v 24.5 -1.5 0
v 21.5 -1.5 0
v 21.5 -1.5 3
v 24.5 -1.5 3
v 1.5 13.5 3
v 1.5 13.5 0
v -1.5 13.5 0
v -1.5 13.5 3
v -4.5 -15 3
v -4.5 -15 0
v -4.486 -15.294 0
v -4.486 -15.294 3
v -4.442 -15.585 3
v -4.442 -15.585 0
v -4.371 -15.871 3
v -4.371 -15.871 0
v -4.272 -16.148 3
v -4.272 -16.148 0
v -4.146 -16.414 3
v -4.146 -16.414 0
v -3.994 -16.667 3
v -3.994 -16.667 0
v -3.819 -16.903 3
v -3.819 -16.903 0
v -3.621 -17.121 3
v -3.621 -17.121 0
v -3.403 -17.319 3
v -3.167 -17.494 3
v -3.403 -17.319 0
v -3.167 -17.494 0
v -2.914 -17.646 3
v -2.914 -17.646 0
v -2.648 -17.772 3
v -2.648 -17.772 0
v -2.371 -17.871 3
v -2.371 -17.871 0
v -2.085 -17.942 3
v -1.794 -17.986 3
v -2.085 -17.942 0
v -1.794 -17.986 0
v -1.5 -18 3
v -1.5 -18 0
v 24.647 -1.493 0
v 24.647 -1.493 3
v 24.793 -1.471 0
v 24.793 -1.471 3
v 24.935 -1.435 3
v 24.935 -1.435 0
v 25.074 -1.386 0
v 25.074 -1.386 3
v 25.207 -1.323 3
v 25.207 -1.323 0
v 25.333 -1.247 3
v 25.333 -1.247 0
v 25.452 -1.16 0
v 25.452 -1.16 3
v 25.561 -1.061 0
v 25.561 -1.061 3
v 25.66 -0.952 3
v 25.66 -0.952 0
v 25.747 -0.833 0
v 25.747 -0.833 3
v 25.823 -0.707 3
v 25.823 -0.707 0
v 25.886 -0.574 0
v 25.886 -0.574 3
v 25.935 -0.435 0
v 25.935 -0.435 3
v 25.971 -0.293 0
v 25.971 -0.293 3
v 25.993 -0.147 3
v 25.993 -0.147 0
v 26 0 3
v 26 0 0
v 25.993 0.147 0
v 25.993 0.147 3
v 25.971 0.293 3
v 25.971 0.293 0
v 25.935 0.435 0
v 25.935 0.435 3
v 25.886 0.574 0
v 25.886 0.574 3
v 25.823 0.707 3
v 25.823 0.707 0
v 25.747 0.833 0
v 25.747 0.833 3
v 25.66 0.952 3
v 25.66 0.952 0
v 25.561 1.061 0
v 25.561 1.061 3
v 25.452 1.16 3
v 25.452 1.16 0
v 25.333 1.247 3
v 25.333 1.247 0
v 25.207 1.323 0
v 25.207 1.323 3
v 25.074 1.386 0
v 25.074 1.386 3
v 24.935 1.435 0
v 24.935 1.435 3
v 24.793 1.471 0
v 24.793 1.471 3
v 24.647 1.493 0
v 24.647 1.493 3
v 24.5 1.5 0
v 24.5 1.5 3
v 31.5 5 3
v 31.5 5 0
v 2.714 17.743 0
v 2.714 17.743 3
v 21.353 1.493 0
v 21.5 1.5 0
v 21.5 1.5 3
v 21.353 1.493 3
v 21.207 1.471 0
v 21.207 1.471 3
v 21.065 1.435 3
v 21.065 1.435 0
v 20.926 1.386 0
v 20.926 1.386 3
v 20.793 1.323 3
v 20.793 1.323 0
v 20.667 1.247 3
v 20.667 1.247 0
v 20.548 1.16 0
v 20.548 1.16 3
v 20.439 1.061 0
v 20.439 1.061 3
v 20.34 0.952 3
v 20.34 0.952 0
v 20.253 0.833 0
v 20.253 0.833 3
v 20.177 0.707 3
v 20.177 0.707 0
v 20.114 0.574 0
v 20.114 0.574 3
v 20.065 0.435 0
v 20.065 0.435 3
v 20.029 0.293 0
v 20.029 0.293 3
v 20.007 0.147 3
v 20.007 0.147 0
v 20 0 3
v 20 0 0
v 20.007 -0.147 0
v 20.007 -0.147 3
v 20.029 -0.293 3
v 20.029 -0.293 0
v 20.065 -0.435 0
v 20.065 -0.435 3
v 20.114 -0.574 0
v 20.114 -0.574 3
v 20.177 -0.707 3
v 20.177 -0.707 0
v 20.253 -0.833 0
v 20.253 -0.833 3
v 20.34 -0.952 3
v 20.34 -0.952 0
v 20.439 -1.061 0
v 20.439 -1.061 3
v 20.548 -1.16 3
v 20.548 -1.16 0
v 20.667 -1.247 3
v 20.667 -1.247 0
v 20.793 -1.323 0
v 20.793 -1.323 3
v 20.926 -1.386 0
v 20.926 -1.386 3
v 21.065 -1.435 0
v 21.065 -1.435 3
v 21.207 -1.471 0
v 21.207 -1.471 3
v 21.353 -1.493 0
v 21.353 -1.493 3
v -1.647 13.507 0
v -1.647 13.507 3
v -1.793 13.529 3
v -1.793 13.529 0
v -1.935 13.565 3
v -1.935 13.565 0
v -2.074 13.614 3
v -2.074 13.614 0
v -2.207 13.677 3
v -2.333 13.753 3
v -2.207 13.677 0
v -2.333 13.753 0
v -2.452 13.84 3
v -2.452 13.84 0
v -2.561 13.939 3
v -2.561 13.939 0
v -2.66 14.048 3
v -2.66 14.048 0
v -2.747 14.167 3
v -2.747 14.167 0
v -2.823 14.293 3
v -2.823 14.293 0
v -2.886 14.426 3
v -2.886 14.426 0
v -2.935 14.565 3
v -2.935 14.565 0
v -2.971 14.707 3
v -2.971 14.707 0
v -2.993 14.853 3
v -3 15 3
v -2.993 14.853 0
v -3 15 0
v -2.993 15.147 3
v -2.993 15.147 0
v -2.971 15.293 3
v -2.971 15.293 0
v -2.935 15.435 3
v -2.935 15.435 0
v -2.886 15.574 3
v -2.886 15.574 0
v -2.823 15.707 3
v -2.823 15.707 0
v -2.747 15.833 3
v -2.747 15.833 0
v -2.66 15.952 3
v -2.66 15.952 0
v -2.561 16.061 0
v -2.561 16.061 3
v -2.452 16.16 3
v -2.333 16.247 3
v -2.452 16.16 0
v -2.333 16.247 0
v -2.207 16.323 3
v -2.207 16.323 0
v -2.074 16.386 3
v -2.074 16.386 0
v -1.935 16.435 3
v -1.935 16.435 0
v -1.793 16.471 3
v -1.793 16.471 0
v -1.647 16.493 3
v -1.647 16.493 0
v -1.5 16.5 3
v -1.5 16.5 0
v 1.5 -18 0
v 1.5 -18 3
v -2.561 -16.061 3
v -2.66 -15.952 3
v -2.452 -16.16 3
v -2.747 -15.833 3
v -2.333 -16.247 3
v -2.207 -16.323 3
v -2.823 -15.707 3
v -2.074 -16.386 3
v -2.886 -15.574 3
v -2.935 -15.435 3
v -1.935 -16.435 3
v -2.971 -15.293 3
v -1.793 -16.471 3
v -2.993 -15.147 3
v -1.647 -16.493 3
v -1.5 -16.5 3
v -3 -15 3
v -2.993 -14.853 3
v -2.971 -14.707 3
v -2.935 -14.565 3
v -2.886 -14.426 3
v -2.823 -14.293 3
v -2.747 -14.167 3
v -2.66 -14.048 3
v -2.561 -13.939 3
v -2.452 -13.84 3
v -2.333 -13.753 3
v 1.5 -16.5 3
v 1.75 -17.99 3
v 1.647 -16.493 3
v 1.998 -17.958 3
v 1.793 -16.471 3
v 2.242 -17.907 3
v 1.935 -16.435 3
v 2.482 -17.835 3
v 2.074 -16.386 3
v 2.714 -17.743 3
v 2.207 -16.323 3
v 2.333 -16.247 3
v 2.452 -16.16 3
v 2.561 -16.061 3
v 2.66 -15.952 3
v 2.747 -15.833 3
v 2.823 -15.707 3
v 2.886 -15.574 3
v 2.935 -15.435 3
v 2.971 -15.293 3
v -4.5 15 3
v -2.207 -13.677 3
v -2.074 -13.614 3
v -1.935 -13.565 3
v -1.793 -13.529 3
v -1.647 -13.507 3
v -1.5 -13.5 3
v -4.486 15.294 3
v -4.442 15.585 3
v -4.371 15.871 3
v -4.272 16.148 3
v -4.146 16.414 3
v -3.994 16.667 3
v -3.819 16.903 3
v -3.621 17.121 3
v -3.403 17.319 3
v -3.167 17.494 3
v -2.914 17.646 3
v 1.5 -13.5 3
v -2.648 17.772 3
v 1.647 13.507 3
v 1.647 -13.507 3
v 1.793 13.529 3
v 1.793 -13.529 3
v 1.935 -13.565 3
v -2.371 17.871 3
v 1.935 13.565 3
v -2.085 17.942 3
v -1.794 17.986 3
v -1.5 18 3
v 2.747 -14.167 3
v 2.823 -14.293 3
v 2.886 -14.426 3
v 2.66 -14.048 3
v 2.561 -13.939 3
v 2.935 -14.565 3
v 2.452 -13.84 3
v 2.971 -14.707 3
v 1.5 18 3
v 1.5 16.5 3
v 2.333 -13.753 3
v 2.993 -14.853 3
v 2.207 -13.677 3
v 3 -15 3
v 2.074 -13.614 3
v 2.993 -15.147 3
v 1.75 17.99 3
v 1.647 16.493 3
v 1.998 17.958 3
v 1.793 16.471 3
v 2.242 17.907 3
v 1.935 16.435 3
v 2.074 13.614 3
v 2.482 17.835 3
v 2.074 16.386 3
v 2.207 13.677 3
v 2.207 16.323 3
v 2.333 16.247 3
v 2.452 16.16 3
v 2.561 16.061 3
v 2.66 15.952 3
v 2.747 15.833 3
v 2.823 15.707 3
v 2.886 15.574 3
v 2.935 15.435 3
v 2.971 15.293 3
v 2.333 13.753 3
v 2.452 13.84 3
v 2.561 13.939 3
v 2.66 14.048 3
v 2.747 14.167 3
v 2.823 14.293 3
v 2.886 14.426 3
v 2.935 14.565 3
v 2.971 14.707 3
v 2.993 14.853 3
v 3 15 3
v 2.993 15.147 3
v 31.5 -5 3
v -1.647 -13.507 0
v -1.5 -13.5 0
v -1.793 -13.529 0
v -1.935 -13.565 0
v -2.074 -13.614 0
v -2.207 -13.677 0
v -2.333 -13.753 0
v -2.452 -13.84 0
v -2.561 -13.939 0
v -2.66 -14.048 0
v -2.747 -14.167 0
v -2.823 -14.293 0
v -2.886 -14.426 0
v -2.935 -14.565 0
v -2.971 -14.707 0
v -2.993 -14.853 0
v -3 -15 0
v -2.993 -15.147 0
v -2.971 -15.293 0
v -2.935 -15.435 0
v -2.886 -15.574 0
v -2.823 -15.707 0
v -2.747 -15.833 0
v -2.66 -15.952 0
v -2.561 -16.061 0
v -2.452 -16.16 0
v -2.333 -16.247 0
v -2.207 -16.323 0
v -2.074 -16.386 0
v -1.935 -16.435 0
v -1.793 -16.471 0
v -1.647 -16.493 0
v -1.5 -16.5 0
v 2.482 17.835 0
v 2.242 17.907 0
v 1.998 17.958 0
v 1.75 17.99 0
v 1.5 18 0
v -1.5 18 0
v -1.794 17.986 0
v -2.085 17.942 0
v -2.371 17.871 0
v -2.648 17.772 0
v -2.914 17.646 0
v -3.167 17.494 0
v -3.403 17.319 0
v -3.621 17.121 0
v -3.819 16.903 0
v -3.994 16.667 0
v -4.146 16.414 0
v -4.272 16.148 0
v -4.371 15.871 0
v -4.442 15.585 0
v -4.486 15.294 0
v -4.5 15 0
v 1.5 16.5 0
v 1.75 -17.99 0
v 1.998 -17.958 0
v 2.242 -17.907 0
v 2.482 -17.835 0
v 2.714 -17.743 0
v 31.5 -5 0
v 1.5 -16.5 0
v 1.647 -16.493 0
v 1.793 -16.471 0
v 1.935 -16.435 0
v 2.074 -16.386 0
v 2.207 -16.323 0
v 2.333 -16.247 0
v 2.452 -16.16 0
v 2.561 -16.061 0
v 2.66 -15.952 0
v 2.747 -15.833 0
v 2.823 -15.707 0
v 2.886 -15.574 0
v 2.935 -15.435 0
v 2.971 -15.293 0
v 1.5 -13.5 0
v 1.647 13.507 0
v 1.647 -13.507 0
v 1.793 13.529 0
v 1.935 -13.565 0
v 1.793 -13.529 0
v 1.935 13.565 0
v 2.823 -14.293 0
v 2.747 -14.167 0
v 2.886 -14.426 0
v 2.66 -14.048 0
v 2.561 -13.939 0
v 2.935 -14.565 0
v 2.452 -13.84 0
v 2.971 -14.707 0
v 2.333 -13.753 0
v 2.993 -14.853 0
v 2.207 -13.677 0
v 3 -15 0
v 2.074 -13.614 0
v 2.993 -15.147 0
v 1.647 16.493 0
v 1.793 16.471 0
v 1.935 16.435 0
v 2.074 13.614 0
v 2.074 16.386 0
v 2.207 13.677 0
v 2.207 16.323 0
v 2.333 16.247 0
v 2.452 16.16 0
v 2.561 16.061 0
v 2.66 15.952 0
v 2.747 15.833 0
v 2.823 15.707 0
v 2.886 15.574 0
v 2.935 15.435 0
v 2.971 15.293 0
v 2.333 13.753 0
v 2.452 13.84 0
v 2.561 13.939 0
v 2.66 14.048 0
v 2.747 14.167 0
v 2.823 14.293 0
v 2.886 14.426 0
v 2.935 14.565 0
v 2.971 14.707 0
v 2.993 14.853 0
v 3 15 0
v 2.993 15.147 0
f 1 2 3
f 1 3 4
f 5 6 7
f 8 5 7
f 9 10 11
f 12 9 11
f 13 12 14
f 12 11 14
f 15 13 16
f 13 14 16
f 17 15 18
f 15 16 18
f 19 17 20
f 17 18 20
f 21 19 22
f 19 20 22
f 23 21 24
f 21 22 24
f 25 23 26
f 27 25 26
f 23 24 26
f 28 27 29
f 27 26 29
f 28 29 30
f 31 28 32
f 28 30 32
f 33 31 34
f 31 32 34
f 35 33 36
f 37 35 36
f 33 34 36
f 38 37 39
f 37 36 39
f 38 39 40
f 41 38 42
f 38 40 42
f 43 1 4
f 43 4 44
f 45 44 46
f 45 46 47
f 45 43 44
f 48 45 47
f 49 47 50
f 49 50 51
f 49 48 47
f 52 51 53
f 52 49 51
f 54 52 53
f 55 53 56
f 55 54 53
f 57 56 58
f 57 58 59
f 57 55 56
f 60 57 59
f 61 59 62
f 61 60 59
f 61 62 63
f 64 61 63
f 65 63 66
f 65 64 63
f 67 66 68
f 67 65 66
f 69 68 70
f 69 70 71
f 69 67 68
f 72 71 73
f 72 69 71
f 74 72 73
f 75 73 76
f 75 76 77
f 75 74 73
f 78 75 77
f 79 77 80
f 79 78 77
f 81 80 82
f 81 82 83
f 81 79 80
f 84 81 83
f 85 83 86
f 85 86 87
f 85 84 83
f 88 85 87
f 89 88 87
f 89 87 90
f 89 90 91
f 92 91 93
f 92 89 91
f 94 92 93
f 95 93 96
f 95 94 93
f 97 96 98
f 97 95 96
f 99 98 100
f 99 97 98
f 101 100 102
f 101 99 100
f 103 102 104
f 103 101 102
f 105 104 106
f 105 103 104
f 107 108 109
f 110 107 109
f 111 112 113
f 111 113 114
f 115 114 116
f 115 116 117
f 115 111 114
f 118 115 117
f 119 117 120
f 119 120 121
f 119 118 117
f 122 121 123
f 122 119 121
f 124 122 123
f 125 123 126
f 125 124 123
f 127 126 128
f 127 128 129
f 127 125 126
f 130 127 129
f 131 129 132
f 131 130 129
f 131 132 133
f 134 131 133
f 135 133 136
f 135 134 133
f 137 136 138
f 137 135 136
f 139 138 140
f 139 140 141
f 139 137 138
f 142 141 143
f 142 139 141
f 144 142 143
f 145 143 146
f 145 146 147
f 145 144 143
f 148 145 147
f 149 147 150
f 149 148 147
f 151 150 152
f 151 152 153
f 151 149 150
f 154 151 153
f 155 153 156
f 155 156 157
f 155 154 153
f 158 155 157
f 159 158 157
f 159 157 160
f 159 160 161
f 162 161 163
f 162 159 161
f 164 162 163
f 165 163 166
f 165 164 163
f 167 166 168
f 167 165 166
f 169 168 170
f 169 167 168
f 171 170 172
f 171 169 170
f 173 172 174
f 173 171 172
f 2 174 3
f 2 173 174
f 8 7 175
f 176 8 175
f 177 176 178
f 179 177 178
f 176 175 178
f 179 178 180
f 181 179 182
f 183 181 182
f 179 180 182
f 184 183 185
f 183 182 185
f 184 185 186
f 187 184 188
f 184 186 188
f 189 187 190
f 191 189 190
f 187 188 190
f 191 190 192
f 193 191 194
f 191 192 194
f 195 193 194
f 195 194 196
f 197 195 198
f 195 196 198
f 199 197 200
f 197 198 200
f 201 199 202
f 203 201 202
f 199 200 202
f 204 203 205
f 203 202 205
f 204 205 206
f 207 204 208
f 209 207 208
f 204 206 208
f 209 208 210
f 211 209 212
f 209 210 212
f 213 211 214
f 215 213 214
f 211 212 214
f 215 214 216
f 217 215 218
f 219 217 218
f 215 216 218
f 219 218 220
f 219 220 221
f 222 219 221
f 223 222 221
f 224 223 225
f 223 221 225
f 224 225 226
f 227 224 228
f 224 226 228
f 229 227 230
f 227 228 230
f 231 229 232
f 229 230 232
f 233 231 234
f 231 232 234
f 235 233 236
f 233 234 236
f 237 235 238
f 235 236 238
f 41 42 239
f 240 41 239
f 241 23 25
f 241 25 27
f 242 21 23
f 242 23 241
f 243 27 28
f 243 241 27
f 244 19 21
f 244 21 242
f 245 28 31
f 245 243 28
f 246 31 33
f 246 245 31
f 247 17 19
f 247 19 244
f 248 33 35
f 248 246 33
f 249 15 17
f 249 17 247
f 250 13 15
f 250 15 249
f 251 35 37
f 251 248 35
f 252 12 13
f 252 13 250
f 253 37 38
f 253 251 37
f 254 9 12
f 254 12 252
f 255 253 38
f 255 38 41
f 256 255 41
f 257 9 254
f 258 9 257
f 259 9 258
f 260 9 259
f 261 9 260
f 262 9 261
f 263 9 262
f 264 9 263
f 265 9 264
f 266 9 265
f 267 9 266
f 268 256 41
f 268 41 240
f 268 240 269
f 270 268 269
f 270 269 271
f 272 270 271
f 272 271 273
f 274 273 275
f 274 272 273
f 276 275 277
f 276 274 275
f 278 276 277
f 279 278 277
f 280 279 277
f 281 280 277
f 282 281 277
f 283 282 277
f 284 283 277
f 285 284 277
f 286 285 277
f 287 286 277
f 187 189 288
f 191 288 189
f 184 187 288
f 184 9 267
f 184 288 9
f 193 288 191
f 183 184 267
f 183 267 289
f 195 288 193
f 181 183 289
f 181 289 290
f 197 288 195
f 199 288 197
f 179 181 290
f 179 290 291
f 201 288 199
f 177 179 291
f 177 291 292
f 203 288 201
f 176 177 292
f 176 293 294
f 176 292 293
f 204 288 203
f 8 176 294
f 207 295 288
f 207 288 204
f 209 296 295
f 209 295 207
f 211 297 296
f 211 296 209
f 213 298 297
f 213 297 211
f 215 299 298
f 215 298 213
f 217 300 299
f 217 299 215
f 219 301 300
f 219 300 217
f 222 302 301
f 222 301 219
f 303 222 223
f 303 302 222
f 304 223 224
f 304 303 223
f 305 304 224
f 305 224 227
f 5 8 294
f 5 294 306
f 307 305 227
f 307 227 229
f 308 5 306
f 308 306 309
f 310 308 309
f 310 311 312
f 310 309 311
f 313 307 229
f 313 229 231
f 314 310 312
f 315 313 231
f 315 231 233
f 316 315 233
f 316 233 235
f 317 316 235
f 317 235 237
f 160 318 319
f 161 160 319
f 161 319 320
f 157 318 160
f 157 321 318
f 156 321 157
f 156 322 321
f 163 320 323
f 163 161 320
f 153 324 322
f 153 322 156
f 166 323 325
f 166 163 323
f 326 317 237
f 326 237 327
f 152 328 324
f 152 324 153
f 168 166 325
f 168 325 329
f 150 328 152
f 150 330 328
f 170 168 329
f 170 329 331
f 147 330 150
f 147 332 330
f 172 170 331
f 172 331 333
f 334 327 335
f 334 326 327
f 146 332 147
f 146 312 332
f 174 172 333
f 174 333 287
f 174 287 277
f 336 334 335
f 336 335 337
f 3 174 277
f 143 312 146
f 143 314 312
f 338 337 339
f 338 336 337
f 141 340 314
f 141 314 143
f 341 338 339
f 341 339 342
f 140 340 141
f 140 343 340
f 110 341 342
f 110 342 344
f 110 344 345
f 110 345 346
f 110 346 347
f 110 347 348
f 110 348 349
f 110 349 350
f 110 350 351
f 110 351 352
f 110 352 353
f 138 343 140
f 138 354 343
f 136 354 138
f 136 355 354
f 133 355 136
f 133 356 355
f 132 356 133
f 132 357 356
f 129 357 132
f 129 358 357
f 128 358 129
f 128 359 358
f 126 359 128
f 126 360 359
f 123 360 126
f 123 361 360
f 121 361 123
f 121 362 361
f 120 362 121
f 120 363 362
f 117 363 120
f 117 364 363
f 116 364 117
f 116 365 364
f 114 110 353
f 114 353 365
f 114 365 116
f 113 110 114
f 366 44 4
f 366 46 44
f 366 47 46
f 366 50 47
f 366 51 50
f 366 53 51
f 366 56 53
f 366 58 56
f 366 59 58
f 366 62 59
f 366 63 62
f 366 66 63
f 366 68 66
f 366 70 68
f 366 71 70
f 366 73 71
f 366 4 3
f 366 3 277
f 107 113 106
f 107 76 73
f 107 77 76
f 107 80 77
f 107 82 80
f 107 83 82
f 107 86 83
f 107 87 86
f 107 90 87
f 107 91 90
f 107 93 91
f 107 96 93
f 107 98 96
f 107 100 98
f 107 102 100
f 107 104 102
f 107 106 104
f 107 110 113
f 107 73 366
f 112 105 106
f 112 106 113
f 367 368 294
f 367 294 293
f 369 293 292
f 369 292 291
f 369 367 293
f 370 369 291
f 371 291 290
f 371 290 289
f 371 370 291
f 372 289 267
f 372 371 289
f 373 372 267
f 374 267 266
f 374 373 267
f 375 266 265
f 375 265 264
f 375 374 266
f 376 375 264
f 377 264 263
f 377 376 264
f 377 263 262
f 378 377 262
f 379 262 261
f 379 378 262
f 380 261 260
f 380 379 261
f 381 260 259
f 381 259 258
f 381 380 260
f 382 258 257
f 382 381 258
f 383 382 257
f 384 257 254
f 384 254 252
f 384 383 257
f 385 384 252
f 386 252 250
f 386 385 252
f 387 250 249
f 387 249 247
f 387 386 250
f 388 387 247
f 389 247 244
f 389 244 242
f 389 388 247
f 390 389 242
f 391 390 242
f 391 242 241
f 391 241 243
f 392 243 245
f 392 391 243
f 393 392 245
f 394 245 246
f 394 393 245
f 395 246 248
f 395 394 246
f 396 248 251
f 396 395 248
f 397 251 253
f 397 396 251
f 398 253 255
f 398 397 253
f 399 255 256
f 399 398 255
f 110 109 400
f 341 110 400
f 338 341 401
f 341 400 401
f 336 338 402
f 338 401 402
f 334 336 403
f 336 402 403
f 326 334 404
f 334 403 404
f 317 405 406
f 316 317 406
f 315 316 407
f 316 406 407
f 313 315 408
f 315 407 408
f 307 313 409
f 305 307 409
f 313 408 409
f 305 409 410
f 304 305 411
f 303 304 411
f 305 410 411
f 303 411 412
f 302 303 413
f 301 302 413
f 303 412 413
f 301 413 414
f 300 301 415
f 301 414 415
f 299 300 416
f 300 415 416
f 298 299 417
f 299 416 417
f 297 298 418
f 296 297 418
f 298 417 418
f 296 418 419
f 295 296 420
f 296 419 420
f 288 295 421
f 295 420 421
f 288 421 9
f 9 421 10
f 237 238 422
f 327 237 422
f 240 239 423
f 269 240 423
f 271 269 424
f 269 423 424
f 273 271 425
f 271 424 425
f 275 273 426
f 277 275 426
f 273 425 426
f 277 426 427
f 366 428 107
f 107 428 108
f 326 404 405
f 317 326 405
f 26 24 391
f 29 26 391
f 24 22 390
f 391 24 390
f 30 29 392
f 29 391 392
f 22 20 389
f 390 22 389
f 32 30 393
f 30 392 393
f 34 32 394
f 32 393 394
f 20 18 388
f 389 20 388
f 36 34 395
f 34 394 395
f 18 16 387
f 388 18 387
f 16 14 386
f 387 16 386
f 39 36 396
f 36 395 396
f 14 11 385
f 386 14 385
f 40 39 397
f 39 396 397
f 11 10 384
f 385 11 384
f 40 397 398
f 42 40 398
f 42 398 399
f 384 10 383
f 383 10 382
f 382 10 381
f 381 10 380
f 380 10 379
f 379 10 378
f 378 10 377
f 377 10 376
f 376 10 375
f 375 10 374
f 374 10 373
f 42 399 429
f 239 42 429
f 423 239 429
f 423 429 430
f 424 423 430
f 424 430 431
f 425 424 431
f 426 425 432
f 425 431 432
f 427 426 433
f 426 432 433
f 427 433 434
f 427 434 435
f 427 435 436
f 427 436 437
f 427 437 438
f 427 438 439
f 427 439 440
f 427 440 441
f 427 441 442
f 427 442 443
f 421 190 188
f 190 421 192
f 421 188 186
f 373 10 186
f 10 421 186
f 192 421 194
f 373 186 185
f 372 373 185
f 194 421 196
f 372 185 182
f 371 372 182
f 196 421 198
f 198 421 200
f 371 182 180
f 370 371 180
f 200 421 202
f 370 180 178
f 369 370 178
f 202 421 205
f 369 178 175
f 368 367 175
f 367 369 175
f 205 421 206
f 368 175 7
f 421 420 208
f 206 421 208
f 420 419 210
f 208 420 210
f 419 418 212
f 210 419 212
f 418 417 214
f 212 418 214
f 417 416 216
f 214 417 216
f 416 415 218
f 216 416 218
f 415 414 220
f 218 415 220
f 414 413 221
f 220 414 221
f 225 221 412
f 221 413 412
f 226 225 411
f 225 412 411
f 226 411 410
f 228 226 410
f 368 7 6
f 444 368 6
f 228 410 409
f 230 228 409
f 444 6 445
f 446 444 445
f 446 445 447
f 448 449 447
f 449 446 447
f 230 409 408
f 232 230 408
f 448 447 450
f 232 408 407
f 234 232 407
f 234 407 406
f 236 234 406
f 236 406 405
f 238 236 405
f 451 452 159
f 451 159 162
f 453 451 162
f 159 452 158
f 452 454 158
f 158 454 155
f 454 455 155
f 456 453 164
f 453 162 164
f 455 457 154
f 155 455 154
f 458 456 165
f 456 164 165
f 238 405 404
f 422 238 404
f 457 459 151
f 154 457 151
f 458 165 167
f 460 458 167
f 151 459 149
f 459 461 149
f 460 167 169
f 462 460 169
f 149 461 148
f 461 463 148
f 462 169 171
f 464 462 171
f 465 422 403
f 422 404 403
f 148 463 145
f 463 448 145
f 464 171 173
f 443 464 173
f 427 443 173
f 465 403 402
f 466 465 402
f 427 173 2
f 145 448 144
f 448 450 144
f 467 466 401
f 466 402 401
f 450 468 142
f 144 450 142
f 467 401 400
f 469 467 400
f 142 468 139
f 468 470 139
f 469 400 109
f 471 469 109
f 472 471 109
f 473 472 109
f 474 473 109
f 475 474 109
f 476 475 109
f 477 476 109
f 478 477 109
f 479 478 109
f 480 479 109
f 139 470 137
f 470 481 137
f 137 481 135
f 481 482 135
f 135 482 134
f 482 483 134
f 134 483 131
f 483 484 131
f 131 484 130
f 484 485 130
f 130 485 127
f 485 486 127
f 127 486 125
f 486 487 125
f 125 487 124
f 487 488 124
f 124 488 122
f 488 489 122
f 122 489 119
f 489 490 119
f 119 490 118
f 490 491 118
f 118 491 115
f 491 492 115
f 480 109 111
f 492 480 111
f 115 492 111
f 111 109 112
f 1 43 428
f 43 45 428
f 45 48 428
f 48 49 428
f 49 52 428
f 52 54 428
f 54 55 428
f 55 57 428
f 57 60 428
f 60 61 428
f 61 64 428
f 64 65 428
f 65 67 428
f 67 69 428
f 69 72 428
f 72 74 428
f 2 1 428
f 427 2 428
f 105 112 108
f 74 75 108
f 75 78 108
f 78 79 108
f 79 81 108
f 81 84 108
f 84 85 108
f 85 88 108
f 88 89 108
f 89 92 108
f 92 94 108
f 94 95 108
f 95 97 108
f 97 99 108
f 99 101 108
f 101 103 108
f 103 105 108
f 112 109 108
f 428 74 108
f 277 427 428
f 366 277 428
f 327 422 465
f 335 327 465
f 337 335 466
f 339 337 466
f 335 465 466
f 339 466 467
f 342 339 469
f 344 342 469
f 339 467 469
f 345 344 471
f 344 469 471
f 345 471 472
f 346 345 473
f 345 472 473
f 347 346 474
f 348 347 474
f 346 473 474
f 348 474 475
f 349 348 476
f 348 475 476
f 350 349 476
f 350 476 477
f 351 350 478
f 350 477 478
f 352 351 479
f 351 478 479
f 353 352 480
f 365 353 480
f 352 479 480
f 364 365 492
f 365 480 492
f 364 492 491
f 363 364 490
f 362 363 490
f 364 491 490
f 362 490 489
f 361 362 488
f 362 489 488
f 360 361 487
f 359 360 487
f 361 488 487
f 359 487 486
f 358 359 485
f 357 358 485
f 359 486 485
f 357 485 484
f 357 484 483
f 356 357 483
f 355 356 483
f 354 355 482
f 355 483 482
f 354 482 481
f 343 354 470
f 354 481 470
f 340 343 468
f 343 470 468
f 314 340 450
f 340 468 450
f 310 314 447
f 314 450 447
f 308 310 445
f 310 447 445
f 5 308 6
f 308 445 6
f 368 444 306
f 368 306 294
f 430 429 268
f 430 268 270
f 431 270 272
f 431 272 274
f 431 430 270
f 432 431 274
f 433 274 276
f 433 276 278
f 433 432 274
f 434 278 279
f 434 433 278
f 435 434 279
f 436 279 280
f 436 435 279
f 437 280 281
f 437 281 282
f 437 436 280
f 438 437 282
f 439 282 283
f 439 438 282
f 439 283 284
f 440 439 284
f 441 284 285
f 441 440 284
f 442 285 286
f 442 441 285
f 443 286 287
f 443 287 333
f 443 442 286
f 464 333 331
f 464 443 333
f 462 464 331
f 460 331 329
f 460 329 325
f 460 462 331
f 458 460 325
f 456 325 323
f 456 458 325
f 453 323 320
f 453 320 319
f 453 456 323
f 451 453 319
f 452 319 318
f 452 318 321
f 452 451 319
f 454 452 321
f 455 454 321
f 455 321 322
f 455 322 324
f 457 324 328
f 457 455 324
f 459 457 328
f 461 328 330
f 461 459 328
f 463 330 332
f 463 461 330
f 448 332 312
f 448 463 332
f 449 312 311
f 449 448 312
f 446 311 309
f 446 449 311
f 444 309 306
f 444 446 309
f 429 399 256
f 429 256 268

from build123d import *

# Parameters (mm, degrees)
BOSS_EXTRUDE1_DEPTH = 3


with BuildPart() as part:
    # Sketch1 → Boss-Extrude1 (new body)
    with BuildSketch(Plane.XY):
        with BuildLine():
            Line((31.5, -5), (31.5, 5))
            Line((31.5, 5), (2.714404574, 17.743213723))
            ThreePointArc((2.714404574, 17.743213723), (2.120628243, 17.935101461), (1.5, 18))
            Line((1.5, 18), (-1.5, 18))
            ThreePointArc((-1.5, 18), (-3.621320344, 17.121320344), (-4.5, 15))
            Line((-4.5, 15), (-4.5, -15))
            ThreePointArc((-4.5, -15), (-3.621320344, -17.121320344), (-1.5, -18))
            Line((-1.5, -18), (1.5, -18))
            ThreePointArc((1.5, -18), (2.120628243, -17.935101461), (2.714404574, -17.743213723))
            Line((2.714404574, -17.743213723), (31.5, -5))
        make_face()
        with BuildLine():
            Line((21.5, -1.5), (24.5, -1.5))
            ThreePointArc((24.5, -1.5), (26, 0), (24.5, 1.5))
            Line((24.5, 1.5), (21.5, 1.5))
            ThreePointArc((21.5, 1.5), (20, 0), (21.5, -1.5))
        make_face(mode=Mode.SUBTRACT)
        with BuildLine():
            Line((-1.5, 16.5), (1.5, 16.5))
            ThreePointArc((1.5, 16.5), (3, 15), (1.5, 13.5))
            Line((1.5, 13.5), (-1.5, 13.5))
            ThreePointArc((-1.5, 13.5), (-3, 15), (-1.5, 16.5))
        make_face(mode=Mode.SUBTRACT)
        with BuildLine():
            Line((1.5, -13.5), (-1.5, -13.5))
            ThreePointArc((-1.5, -13.5), (-3, -15), (-1.5, -16.5))
            Line((-1.5, -16.5), (1.5, -16.5))
            ThreePointArc((1.5, -16.5), (3, -15), (1.5, -13.5))
        make_face(mode=Mode.SUBTRACT)
    extrude(amount=BOSS_EXTRUDE1_DEPTH)


solid = part.part
